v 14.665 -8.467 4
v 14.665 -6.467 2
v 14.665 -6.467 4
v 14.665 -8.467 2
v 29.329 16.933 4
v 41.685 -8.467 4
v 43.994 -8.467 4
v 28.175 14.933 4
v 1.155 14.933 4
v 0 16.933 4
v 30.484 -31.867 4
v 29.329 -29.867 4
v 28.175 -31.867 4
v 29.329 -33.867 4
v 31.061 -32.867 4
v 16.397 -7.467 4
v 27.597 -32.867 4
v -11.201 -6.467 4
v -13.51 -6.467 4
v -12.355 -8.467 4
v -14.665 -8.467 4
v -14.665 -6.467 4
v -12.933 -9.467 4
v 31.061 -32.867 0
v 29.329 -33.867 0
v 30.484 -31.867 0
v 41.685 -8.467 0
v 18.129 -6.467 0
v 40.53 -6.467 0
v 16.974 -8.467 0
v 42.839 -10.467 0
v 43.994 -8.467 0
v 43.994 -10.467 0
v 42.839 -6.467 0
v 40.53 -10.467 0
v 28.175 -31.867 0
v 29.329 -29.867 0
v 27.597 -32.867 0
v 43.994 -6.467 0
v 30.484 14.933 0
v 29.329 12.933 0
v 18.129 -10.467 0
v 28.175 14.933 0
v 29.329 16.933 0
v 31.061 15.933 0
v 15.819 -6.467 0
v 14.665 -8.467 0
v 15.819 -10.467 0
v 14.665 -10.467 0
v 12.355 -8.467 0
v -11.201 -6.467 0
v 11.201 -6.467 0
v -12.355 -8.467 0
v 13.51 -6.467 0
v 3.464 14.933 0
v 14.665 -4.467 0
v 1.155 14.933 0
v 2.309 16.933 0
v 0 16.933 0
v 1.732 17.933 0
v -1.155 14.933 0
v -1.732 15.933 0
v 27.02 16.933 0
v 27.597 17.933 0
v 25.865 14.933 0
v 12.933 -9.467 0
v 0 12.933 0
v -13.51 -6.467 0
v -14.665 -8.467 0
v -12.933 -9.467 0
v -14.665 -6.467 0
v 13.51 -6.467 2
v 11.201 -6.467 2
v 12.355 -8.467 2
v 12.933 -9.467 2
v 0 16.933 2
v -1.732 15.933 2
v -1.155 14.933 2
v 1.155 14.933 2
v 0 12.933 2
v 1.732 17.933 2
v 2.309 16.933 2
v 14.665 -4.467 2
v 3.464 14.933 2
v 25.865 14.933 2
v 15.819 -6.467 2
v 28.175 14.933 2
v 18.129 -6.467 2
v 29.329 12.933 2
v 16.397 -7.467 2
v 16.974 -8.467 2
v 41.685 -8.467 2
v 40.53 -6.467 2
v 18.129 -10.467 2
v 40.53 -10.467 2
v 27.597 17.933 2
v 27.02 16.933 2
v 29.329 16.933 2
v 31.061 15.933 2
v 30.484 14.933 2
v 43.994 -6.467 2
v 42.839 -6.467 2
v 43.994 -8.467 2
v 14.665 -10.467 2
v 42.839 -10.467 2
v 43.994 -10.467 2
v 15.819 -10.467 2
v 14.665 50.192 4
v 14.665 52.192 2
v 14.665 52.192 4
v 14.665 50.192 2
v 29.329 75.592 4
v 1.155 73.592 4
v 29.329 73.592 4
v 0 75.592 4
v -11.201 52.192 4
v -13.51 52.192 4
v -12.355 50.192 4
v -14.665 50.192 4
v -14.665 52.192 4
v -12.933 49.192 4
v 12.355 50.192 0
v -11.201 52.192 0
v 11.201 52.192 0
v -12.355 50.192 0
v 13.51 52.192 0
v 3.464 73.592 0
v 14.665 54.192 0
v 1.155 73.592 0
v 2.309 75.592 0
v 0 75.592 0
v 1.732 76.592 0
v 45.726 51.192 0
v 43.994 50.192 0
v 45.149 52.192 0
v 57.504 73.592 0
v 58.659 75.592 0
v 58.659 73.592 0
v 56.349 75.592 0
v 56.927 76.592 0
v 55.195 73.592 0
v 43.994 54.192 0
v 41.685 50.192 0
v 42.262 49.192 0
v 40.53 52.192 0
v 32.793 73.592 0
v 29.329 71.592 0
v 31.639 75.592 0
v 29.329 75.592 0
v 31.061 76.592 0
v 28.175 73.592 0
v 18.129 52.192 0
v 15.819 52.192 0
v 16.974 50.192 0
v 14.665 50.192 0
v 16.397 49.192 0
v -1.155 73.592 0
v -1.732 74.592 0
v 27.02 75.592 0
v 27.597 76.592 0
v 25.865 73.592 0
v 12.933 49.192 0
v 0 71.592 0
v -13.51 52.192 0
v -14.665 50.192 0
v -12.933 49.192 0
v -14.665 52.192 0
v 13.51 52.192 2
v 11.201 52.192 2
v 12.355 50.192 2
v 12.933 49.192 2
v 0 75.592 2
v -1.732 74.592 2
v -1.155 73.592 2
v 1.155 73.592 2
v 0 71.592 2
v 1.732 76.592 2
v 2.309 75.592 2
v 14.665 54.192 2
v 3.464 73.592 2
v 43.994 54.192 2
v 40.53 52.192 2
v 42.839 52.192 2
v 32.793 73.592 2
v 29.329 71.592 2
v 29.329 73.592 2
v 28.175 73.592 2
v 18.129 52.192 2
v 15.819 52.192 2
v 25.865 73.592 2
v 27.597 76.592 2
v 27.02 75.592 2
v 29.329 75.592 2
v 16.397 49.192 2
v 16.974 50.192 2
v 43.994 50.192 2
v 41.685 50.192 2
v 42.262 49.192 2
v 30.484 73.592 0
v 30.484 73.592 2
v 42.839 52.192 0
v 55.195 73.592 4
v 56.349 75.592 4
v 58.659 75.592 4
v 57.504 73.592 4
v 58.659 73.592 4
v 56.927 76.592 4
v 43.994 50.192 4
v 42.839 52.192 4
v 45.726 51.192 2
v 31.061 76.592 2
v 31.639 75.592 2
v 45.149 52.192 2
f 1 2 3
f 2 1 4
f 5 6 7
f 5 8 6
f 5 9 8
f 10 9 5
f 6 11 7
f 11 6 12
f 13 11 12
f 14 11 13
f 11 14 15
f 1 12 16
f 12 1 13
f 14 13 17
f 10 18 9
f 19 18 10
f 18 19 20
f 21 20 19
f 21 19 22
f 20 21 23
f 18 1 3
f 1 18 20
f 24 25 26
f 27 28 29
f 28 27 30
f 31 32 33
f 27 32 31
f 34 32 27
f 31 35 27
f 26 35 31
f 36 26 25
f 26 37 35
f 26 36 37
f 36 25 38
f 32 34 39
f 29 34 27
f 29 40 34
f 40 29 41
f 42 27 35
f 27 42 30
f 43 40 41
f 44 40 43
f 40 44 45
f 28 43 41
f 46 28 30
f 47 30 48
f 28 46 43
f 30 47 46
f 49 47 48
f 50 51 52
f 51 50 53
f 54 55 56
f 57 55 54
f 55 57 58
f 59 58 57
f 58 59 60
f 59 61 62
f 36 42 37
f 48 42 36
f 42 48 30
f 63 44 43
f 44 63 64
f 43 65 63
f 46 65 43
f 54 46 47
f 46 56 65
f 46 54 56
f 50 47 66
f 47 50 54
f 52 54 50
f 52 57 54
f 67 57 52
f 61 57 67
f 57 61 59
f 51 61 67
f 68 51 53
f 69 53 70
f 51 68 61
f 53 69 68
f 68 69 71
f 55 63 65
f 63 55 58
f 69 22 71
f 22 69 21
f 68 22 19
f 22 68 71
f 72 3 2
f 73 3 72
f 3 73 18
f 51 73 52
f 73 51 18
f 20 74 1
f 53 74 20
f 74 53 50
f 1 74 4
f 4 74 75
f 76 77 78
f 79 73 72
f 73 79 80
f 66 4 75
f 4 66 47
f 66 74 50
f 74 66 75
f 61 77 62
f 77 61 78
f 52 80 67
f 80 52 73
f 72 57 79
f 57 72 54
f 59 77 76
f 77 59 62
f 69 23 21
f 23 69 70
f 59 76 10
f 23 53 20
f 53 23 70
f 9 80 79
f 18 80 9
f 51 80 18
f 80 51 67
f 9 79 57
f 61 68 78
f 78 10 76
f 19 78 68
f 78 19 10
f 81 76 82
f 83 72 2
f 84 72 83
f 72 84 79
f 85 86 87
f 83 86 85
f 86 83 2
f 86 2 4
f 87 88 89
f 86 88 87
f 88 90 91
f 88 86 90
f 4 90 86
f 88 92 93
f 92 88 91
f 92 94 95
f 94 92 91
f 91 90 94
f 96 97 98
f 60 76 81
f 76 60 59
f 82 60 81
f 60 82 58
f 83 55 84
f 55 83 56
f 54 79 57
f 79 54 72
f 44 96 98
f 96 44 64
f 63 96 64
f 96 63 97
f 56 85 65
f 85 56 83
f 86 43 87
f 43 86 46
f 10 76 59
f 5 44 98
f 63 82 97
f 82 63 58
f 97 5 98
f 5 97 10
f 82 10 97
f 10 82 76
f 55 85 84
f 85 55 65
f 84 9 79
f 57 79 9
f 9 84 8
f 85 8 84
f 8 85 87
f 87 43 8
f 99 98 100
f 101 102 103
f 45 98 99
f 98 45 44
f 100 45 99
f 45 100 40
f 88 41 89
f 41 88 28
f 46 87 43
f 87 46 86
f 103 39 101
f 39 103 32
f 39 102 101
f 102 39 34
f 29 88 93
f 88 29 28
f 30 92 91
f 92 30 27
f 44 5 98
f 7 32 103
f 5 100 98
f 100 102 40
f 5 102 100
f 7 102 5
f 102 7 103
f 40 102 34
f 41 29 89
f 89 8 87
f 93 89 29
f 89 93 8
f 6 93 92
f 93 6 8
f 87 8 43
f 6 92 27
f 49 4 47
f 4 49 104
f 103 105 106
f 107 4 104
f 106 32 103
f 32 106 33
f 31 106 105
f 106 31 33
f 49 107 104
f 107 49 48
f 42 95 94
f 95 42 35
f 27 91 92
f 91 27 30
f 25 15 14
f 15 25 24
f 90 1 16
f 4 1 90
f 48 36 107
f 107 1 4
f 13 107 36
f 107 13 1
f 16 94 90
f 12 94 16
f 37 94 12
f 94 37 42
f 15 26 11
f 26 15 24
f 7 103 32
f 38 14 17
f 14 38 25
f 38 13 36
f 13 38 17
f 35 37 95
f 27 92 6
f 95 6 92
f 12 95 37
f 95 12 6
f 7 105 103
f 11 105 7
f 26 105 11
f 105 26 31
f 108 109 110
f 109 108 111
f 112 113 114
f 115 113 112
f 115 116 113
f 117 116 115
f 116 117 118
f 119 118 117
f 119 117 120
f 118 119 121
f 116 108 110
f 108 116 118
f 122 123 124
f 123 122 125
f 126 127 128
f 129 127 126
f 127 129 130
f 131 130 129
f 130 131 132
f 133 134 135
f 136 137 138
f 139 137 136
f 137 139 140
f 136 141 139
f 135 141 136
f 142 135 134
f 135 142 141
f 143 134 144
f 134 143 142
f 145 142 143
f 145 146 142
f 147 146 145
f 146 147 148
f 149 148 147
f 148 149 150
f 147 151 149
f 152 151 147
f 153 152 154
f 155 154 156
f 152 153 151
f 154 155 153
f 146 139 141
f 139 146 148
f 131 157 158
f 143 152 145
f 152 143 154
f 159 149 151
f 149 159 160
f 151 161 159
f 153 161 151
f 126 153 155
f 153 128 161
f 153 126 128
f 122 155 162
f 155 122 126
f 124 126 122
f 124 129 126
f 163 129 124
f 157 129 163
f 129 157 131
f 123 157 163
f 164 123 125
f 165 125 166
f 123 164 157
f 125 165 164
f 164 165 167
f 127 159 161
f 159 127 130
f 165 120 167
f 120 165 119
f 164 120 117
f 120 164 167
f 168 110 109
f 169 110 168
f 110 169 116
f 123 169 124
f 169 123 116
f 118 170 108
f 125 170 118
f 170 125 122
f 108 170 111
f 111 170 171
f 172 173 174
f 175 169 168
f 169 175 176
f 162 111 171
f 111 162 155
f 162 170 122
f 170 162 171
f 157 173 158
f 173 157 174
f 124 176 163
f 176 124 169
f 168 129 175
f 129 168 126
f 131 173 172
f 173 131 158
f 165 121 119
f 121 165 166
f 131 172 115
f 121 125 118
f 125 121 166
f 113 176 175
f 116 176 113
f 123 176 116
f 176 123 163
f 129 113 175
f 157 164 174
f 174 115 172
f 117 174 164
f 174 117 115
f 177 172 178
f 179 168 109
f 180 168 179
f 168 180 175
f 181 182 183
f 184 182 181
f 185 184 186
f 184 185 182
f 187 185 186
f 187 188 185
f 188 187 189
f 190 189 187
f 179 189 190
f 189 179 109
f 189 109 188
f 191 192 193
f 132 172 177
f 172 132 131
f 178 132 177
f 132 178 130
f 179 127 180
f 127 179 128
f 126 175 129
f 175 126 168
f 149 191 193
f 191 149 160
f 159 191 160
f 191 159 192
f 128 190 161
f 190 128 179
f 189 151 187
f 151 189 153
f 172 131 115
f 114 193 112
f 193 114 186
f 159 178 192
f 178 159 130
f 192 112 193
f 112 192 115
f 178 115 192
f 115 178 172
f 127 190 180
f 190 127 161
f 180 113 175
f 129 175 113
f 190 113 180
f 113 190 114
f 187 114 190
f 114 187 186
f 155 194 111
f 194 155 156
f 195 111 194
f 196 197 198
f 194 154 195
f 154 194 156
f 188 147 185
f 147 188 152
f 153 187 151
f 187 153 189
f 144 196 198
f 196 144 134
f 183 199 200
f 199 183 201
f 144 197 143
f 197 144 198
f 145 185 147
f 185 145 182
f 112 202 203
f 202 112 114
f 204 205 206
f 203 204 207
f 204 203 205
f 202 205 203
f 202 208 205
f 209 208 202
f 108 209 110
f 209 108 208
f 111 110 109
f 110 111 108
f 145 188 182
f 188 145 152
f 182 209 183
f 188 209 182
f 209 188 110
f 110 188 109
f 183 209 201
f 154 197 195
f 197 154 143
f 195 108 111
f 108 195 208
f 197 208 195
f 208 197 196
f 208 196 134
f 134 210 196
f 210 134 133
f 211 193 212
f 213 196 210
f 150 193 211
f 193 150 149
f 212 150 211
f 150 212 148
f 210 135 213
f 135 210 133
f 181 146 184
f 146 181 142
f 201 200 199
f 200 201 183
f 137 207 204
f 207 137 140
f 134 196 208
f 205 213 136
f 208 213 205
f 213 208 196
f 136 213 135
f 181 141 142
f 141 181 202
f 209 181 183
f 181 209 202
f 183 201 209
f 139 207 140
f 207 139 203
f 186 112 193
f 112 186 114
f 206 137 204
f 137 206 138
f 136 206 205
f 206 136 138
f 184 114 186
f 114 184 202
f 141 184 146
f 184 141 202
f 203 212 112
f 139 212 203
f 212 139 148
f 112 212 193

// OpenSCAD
// bottom is increased by bevel on axis from centre to point
module triangle (h, r, b=0) {
    cylinder(h=h, r1=r+b, r2=r, $fn=3);
}

thickness = 2;

//rotate([0,0,-30]) triangle(thickness, tri_radius, 0);

tri_height = 25.4; // 1 inch
tri_width  = tri_height * 2 / sqrt(3);
tri_radius = tri_height * 2 / 3;

module side () {
    s = [tri_width*2, tri_height, thickness];
    translate([-tri_width,-tri_height+tri_radius,0]) cube(s);
}

module open_side () {
    translate([-tri_width/2,-tri_height+tri_radius,0])
    cube([tri_width, thickness, thickness*2]);
}

module closed_side () {
    translate([-tri_width/2,-tri_height+tri_radius,0])
    cube([tri_width, thickness, thickness]);
}


module piece (data) {
    for(i=[0:2]) {
        rotate([0,0,sign(data)*i*120])
        if (abs(data) / pow(2,i) % 2 >= 1) {
            open_side();
        } else {
            closed_side();
        }
    }
}

module pieces (pattern=[], index=0) {
    if (index < len(pattern)){
        clockwise = sign(pattern[index]);
        piece(pattern[index]);
        rotate([0,0,-60*clockwise]) translate([0, tri_radius, 0]) pieces(pattern, index+1);
     }
}

pacman = [5,4,4,6];
stick = [5,4,-4,6];

offset = [0,2*tri_width,0];

pieces(pacman);
translate(offset) pieces(stick);
